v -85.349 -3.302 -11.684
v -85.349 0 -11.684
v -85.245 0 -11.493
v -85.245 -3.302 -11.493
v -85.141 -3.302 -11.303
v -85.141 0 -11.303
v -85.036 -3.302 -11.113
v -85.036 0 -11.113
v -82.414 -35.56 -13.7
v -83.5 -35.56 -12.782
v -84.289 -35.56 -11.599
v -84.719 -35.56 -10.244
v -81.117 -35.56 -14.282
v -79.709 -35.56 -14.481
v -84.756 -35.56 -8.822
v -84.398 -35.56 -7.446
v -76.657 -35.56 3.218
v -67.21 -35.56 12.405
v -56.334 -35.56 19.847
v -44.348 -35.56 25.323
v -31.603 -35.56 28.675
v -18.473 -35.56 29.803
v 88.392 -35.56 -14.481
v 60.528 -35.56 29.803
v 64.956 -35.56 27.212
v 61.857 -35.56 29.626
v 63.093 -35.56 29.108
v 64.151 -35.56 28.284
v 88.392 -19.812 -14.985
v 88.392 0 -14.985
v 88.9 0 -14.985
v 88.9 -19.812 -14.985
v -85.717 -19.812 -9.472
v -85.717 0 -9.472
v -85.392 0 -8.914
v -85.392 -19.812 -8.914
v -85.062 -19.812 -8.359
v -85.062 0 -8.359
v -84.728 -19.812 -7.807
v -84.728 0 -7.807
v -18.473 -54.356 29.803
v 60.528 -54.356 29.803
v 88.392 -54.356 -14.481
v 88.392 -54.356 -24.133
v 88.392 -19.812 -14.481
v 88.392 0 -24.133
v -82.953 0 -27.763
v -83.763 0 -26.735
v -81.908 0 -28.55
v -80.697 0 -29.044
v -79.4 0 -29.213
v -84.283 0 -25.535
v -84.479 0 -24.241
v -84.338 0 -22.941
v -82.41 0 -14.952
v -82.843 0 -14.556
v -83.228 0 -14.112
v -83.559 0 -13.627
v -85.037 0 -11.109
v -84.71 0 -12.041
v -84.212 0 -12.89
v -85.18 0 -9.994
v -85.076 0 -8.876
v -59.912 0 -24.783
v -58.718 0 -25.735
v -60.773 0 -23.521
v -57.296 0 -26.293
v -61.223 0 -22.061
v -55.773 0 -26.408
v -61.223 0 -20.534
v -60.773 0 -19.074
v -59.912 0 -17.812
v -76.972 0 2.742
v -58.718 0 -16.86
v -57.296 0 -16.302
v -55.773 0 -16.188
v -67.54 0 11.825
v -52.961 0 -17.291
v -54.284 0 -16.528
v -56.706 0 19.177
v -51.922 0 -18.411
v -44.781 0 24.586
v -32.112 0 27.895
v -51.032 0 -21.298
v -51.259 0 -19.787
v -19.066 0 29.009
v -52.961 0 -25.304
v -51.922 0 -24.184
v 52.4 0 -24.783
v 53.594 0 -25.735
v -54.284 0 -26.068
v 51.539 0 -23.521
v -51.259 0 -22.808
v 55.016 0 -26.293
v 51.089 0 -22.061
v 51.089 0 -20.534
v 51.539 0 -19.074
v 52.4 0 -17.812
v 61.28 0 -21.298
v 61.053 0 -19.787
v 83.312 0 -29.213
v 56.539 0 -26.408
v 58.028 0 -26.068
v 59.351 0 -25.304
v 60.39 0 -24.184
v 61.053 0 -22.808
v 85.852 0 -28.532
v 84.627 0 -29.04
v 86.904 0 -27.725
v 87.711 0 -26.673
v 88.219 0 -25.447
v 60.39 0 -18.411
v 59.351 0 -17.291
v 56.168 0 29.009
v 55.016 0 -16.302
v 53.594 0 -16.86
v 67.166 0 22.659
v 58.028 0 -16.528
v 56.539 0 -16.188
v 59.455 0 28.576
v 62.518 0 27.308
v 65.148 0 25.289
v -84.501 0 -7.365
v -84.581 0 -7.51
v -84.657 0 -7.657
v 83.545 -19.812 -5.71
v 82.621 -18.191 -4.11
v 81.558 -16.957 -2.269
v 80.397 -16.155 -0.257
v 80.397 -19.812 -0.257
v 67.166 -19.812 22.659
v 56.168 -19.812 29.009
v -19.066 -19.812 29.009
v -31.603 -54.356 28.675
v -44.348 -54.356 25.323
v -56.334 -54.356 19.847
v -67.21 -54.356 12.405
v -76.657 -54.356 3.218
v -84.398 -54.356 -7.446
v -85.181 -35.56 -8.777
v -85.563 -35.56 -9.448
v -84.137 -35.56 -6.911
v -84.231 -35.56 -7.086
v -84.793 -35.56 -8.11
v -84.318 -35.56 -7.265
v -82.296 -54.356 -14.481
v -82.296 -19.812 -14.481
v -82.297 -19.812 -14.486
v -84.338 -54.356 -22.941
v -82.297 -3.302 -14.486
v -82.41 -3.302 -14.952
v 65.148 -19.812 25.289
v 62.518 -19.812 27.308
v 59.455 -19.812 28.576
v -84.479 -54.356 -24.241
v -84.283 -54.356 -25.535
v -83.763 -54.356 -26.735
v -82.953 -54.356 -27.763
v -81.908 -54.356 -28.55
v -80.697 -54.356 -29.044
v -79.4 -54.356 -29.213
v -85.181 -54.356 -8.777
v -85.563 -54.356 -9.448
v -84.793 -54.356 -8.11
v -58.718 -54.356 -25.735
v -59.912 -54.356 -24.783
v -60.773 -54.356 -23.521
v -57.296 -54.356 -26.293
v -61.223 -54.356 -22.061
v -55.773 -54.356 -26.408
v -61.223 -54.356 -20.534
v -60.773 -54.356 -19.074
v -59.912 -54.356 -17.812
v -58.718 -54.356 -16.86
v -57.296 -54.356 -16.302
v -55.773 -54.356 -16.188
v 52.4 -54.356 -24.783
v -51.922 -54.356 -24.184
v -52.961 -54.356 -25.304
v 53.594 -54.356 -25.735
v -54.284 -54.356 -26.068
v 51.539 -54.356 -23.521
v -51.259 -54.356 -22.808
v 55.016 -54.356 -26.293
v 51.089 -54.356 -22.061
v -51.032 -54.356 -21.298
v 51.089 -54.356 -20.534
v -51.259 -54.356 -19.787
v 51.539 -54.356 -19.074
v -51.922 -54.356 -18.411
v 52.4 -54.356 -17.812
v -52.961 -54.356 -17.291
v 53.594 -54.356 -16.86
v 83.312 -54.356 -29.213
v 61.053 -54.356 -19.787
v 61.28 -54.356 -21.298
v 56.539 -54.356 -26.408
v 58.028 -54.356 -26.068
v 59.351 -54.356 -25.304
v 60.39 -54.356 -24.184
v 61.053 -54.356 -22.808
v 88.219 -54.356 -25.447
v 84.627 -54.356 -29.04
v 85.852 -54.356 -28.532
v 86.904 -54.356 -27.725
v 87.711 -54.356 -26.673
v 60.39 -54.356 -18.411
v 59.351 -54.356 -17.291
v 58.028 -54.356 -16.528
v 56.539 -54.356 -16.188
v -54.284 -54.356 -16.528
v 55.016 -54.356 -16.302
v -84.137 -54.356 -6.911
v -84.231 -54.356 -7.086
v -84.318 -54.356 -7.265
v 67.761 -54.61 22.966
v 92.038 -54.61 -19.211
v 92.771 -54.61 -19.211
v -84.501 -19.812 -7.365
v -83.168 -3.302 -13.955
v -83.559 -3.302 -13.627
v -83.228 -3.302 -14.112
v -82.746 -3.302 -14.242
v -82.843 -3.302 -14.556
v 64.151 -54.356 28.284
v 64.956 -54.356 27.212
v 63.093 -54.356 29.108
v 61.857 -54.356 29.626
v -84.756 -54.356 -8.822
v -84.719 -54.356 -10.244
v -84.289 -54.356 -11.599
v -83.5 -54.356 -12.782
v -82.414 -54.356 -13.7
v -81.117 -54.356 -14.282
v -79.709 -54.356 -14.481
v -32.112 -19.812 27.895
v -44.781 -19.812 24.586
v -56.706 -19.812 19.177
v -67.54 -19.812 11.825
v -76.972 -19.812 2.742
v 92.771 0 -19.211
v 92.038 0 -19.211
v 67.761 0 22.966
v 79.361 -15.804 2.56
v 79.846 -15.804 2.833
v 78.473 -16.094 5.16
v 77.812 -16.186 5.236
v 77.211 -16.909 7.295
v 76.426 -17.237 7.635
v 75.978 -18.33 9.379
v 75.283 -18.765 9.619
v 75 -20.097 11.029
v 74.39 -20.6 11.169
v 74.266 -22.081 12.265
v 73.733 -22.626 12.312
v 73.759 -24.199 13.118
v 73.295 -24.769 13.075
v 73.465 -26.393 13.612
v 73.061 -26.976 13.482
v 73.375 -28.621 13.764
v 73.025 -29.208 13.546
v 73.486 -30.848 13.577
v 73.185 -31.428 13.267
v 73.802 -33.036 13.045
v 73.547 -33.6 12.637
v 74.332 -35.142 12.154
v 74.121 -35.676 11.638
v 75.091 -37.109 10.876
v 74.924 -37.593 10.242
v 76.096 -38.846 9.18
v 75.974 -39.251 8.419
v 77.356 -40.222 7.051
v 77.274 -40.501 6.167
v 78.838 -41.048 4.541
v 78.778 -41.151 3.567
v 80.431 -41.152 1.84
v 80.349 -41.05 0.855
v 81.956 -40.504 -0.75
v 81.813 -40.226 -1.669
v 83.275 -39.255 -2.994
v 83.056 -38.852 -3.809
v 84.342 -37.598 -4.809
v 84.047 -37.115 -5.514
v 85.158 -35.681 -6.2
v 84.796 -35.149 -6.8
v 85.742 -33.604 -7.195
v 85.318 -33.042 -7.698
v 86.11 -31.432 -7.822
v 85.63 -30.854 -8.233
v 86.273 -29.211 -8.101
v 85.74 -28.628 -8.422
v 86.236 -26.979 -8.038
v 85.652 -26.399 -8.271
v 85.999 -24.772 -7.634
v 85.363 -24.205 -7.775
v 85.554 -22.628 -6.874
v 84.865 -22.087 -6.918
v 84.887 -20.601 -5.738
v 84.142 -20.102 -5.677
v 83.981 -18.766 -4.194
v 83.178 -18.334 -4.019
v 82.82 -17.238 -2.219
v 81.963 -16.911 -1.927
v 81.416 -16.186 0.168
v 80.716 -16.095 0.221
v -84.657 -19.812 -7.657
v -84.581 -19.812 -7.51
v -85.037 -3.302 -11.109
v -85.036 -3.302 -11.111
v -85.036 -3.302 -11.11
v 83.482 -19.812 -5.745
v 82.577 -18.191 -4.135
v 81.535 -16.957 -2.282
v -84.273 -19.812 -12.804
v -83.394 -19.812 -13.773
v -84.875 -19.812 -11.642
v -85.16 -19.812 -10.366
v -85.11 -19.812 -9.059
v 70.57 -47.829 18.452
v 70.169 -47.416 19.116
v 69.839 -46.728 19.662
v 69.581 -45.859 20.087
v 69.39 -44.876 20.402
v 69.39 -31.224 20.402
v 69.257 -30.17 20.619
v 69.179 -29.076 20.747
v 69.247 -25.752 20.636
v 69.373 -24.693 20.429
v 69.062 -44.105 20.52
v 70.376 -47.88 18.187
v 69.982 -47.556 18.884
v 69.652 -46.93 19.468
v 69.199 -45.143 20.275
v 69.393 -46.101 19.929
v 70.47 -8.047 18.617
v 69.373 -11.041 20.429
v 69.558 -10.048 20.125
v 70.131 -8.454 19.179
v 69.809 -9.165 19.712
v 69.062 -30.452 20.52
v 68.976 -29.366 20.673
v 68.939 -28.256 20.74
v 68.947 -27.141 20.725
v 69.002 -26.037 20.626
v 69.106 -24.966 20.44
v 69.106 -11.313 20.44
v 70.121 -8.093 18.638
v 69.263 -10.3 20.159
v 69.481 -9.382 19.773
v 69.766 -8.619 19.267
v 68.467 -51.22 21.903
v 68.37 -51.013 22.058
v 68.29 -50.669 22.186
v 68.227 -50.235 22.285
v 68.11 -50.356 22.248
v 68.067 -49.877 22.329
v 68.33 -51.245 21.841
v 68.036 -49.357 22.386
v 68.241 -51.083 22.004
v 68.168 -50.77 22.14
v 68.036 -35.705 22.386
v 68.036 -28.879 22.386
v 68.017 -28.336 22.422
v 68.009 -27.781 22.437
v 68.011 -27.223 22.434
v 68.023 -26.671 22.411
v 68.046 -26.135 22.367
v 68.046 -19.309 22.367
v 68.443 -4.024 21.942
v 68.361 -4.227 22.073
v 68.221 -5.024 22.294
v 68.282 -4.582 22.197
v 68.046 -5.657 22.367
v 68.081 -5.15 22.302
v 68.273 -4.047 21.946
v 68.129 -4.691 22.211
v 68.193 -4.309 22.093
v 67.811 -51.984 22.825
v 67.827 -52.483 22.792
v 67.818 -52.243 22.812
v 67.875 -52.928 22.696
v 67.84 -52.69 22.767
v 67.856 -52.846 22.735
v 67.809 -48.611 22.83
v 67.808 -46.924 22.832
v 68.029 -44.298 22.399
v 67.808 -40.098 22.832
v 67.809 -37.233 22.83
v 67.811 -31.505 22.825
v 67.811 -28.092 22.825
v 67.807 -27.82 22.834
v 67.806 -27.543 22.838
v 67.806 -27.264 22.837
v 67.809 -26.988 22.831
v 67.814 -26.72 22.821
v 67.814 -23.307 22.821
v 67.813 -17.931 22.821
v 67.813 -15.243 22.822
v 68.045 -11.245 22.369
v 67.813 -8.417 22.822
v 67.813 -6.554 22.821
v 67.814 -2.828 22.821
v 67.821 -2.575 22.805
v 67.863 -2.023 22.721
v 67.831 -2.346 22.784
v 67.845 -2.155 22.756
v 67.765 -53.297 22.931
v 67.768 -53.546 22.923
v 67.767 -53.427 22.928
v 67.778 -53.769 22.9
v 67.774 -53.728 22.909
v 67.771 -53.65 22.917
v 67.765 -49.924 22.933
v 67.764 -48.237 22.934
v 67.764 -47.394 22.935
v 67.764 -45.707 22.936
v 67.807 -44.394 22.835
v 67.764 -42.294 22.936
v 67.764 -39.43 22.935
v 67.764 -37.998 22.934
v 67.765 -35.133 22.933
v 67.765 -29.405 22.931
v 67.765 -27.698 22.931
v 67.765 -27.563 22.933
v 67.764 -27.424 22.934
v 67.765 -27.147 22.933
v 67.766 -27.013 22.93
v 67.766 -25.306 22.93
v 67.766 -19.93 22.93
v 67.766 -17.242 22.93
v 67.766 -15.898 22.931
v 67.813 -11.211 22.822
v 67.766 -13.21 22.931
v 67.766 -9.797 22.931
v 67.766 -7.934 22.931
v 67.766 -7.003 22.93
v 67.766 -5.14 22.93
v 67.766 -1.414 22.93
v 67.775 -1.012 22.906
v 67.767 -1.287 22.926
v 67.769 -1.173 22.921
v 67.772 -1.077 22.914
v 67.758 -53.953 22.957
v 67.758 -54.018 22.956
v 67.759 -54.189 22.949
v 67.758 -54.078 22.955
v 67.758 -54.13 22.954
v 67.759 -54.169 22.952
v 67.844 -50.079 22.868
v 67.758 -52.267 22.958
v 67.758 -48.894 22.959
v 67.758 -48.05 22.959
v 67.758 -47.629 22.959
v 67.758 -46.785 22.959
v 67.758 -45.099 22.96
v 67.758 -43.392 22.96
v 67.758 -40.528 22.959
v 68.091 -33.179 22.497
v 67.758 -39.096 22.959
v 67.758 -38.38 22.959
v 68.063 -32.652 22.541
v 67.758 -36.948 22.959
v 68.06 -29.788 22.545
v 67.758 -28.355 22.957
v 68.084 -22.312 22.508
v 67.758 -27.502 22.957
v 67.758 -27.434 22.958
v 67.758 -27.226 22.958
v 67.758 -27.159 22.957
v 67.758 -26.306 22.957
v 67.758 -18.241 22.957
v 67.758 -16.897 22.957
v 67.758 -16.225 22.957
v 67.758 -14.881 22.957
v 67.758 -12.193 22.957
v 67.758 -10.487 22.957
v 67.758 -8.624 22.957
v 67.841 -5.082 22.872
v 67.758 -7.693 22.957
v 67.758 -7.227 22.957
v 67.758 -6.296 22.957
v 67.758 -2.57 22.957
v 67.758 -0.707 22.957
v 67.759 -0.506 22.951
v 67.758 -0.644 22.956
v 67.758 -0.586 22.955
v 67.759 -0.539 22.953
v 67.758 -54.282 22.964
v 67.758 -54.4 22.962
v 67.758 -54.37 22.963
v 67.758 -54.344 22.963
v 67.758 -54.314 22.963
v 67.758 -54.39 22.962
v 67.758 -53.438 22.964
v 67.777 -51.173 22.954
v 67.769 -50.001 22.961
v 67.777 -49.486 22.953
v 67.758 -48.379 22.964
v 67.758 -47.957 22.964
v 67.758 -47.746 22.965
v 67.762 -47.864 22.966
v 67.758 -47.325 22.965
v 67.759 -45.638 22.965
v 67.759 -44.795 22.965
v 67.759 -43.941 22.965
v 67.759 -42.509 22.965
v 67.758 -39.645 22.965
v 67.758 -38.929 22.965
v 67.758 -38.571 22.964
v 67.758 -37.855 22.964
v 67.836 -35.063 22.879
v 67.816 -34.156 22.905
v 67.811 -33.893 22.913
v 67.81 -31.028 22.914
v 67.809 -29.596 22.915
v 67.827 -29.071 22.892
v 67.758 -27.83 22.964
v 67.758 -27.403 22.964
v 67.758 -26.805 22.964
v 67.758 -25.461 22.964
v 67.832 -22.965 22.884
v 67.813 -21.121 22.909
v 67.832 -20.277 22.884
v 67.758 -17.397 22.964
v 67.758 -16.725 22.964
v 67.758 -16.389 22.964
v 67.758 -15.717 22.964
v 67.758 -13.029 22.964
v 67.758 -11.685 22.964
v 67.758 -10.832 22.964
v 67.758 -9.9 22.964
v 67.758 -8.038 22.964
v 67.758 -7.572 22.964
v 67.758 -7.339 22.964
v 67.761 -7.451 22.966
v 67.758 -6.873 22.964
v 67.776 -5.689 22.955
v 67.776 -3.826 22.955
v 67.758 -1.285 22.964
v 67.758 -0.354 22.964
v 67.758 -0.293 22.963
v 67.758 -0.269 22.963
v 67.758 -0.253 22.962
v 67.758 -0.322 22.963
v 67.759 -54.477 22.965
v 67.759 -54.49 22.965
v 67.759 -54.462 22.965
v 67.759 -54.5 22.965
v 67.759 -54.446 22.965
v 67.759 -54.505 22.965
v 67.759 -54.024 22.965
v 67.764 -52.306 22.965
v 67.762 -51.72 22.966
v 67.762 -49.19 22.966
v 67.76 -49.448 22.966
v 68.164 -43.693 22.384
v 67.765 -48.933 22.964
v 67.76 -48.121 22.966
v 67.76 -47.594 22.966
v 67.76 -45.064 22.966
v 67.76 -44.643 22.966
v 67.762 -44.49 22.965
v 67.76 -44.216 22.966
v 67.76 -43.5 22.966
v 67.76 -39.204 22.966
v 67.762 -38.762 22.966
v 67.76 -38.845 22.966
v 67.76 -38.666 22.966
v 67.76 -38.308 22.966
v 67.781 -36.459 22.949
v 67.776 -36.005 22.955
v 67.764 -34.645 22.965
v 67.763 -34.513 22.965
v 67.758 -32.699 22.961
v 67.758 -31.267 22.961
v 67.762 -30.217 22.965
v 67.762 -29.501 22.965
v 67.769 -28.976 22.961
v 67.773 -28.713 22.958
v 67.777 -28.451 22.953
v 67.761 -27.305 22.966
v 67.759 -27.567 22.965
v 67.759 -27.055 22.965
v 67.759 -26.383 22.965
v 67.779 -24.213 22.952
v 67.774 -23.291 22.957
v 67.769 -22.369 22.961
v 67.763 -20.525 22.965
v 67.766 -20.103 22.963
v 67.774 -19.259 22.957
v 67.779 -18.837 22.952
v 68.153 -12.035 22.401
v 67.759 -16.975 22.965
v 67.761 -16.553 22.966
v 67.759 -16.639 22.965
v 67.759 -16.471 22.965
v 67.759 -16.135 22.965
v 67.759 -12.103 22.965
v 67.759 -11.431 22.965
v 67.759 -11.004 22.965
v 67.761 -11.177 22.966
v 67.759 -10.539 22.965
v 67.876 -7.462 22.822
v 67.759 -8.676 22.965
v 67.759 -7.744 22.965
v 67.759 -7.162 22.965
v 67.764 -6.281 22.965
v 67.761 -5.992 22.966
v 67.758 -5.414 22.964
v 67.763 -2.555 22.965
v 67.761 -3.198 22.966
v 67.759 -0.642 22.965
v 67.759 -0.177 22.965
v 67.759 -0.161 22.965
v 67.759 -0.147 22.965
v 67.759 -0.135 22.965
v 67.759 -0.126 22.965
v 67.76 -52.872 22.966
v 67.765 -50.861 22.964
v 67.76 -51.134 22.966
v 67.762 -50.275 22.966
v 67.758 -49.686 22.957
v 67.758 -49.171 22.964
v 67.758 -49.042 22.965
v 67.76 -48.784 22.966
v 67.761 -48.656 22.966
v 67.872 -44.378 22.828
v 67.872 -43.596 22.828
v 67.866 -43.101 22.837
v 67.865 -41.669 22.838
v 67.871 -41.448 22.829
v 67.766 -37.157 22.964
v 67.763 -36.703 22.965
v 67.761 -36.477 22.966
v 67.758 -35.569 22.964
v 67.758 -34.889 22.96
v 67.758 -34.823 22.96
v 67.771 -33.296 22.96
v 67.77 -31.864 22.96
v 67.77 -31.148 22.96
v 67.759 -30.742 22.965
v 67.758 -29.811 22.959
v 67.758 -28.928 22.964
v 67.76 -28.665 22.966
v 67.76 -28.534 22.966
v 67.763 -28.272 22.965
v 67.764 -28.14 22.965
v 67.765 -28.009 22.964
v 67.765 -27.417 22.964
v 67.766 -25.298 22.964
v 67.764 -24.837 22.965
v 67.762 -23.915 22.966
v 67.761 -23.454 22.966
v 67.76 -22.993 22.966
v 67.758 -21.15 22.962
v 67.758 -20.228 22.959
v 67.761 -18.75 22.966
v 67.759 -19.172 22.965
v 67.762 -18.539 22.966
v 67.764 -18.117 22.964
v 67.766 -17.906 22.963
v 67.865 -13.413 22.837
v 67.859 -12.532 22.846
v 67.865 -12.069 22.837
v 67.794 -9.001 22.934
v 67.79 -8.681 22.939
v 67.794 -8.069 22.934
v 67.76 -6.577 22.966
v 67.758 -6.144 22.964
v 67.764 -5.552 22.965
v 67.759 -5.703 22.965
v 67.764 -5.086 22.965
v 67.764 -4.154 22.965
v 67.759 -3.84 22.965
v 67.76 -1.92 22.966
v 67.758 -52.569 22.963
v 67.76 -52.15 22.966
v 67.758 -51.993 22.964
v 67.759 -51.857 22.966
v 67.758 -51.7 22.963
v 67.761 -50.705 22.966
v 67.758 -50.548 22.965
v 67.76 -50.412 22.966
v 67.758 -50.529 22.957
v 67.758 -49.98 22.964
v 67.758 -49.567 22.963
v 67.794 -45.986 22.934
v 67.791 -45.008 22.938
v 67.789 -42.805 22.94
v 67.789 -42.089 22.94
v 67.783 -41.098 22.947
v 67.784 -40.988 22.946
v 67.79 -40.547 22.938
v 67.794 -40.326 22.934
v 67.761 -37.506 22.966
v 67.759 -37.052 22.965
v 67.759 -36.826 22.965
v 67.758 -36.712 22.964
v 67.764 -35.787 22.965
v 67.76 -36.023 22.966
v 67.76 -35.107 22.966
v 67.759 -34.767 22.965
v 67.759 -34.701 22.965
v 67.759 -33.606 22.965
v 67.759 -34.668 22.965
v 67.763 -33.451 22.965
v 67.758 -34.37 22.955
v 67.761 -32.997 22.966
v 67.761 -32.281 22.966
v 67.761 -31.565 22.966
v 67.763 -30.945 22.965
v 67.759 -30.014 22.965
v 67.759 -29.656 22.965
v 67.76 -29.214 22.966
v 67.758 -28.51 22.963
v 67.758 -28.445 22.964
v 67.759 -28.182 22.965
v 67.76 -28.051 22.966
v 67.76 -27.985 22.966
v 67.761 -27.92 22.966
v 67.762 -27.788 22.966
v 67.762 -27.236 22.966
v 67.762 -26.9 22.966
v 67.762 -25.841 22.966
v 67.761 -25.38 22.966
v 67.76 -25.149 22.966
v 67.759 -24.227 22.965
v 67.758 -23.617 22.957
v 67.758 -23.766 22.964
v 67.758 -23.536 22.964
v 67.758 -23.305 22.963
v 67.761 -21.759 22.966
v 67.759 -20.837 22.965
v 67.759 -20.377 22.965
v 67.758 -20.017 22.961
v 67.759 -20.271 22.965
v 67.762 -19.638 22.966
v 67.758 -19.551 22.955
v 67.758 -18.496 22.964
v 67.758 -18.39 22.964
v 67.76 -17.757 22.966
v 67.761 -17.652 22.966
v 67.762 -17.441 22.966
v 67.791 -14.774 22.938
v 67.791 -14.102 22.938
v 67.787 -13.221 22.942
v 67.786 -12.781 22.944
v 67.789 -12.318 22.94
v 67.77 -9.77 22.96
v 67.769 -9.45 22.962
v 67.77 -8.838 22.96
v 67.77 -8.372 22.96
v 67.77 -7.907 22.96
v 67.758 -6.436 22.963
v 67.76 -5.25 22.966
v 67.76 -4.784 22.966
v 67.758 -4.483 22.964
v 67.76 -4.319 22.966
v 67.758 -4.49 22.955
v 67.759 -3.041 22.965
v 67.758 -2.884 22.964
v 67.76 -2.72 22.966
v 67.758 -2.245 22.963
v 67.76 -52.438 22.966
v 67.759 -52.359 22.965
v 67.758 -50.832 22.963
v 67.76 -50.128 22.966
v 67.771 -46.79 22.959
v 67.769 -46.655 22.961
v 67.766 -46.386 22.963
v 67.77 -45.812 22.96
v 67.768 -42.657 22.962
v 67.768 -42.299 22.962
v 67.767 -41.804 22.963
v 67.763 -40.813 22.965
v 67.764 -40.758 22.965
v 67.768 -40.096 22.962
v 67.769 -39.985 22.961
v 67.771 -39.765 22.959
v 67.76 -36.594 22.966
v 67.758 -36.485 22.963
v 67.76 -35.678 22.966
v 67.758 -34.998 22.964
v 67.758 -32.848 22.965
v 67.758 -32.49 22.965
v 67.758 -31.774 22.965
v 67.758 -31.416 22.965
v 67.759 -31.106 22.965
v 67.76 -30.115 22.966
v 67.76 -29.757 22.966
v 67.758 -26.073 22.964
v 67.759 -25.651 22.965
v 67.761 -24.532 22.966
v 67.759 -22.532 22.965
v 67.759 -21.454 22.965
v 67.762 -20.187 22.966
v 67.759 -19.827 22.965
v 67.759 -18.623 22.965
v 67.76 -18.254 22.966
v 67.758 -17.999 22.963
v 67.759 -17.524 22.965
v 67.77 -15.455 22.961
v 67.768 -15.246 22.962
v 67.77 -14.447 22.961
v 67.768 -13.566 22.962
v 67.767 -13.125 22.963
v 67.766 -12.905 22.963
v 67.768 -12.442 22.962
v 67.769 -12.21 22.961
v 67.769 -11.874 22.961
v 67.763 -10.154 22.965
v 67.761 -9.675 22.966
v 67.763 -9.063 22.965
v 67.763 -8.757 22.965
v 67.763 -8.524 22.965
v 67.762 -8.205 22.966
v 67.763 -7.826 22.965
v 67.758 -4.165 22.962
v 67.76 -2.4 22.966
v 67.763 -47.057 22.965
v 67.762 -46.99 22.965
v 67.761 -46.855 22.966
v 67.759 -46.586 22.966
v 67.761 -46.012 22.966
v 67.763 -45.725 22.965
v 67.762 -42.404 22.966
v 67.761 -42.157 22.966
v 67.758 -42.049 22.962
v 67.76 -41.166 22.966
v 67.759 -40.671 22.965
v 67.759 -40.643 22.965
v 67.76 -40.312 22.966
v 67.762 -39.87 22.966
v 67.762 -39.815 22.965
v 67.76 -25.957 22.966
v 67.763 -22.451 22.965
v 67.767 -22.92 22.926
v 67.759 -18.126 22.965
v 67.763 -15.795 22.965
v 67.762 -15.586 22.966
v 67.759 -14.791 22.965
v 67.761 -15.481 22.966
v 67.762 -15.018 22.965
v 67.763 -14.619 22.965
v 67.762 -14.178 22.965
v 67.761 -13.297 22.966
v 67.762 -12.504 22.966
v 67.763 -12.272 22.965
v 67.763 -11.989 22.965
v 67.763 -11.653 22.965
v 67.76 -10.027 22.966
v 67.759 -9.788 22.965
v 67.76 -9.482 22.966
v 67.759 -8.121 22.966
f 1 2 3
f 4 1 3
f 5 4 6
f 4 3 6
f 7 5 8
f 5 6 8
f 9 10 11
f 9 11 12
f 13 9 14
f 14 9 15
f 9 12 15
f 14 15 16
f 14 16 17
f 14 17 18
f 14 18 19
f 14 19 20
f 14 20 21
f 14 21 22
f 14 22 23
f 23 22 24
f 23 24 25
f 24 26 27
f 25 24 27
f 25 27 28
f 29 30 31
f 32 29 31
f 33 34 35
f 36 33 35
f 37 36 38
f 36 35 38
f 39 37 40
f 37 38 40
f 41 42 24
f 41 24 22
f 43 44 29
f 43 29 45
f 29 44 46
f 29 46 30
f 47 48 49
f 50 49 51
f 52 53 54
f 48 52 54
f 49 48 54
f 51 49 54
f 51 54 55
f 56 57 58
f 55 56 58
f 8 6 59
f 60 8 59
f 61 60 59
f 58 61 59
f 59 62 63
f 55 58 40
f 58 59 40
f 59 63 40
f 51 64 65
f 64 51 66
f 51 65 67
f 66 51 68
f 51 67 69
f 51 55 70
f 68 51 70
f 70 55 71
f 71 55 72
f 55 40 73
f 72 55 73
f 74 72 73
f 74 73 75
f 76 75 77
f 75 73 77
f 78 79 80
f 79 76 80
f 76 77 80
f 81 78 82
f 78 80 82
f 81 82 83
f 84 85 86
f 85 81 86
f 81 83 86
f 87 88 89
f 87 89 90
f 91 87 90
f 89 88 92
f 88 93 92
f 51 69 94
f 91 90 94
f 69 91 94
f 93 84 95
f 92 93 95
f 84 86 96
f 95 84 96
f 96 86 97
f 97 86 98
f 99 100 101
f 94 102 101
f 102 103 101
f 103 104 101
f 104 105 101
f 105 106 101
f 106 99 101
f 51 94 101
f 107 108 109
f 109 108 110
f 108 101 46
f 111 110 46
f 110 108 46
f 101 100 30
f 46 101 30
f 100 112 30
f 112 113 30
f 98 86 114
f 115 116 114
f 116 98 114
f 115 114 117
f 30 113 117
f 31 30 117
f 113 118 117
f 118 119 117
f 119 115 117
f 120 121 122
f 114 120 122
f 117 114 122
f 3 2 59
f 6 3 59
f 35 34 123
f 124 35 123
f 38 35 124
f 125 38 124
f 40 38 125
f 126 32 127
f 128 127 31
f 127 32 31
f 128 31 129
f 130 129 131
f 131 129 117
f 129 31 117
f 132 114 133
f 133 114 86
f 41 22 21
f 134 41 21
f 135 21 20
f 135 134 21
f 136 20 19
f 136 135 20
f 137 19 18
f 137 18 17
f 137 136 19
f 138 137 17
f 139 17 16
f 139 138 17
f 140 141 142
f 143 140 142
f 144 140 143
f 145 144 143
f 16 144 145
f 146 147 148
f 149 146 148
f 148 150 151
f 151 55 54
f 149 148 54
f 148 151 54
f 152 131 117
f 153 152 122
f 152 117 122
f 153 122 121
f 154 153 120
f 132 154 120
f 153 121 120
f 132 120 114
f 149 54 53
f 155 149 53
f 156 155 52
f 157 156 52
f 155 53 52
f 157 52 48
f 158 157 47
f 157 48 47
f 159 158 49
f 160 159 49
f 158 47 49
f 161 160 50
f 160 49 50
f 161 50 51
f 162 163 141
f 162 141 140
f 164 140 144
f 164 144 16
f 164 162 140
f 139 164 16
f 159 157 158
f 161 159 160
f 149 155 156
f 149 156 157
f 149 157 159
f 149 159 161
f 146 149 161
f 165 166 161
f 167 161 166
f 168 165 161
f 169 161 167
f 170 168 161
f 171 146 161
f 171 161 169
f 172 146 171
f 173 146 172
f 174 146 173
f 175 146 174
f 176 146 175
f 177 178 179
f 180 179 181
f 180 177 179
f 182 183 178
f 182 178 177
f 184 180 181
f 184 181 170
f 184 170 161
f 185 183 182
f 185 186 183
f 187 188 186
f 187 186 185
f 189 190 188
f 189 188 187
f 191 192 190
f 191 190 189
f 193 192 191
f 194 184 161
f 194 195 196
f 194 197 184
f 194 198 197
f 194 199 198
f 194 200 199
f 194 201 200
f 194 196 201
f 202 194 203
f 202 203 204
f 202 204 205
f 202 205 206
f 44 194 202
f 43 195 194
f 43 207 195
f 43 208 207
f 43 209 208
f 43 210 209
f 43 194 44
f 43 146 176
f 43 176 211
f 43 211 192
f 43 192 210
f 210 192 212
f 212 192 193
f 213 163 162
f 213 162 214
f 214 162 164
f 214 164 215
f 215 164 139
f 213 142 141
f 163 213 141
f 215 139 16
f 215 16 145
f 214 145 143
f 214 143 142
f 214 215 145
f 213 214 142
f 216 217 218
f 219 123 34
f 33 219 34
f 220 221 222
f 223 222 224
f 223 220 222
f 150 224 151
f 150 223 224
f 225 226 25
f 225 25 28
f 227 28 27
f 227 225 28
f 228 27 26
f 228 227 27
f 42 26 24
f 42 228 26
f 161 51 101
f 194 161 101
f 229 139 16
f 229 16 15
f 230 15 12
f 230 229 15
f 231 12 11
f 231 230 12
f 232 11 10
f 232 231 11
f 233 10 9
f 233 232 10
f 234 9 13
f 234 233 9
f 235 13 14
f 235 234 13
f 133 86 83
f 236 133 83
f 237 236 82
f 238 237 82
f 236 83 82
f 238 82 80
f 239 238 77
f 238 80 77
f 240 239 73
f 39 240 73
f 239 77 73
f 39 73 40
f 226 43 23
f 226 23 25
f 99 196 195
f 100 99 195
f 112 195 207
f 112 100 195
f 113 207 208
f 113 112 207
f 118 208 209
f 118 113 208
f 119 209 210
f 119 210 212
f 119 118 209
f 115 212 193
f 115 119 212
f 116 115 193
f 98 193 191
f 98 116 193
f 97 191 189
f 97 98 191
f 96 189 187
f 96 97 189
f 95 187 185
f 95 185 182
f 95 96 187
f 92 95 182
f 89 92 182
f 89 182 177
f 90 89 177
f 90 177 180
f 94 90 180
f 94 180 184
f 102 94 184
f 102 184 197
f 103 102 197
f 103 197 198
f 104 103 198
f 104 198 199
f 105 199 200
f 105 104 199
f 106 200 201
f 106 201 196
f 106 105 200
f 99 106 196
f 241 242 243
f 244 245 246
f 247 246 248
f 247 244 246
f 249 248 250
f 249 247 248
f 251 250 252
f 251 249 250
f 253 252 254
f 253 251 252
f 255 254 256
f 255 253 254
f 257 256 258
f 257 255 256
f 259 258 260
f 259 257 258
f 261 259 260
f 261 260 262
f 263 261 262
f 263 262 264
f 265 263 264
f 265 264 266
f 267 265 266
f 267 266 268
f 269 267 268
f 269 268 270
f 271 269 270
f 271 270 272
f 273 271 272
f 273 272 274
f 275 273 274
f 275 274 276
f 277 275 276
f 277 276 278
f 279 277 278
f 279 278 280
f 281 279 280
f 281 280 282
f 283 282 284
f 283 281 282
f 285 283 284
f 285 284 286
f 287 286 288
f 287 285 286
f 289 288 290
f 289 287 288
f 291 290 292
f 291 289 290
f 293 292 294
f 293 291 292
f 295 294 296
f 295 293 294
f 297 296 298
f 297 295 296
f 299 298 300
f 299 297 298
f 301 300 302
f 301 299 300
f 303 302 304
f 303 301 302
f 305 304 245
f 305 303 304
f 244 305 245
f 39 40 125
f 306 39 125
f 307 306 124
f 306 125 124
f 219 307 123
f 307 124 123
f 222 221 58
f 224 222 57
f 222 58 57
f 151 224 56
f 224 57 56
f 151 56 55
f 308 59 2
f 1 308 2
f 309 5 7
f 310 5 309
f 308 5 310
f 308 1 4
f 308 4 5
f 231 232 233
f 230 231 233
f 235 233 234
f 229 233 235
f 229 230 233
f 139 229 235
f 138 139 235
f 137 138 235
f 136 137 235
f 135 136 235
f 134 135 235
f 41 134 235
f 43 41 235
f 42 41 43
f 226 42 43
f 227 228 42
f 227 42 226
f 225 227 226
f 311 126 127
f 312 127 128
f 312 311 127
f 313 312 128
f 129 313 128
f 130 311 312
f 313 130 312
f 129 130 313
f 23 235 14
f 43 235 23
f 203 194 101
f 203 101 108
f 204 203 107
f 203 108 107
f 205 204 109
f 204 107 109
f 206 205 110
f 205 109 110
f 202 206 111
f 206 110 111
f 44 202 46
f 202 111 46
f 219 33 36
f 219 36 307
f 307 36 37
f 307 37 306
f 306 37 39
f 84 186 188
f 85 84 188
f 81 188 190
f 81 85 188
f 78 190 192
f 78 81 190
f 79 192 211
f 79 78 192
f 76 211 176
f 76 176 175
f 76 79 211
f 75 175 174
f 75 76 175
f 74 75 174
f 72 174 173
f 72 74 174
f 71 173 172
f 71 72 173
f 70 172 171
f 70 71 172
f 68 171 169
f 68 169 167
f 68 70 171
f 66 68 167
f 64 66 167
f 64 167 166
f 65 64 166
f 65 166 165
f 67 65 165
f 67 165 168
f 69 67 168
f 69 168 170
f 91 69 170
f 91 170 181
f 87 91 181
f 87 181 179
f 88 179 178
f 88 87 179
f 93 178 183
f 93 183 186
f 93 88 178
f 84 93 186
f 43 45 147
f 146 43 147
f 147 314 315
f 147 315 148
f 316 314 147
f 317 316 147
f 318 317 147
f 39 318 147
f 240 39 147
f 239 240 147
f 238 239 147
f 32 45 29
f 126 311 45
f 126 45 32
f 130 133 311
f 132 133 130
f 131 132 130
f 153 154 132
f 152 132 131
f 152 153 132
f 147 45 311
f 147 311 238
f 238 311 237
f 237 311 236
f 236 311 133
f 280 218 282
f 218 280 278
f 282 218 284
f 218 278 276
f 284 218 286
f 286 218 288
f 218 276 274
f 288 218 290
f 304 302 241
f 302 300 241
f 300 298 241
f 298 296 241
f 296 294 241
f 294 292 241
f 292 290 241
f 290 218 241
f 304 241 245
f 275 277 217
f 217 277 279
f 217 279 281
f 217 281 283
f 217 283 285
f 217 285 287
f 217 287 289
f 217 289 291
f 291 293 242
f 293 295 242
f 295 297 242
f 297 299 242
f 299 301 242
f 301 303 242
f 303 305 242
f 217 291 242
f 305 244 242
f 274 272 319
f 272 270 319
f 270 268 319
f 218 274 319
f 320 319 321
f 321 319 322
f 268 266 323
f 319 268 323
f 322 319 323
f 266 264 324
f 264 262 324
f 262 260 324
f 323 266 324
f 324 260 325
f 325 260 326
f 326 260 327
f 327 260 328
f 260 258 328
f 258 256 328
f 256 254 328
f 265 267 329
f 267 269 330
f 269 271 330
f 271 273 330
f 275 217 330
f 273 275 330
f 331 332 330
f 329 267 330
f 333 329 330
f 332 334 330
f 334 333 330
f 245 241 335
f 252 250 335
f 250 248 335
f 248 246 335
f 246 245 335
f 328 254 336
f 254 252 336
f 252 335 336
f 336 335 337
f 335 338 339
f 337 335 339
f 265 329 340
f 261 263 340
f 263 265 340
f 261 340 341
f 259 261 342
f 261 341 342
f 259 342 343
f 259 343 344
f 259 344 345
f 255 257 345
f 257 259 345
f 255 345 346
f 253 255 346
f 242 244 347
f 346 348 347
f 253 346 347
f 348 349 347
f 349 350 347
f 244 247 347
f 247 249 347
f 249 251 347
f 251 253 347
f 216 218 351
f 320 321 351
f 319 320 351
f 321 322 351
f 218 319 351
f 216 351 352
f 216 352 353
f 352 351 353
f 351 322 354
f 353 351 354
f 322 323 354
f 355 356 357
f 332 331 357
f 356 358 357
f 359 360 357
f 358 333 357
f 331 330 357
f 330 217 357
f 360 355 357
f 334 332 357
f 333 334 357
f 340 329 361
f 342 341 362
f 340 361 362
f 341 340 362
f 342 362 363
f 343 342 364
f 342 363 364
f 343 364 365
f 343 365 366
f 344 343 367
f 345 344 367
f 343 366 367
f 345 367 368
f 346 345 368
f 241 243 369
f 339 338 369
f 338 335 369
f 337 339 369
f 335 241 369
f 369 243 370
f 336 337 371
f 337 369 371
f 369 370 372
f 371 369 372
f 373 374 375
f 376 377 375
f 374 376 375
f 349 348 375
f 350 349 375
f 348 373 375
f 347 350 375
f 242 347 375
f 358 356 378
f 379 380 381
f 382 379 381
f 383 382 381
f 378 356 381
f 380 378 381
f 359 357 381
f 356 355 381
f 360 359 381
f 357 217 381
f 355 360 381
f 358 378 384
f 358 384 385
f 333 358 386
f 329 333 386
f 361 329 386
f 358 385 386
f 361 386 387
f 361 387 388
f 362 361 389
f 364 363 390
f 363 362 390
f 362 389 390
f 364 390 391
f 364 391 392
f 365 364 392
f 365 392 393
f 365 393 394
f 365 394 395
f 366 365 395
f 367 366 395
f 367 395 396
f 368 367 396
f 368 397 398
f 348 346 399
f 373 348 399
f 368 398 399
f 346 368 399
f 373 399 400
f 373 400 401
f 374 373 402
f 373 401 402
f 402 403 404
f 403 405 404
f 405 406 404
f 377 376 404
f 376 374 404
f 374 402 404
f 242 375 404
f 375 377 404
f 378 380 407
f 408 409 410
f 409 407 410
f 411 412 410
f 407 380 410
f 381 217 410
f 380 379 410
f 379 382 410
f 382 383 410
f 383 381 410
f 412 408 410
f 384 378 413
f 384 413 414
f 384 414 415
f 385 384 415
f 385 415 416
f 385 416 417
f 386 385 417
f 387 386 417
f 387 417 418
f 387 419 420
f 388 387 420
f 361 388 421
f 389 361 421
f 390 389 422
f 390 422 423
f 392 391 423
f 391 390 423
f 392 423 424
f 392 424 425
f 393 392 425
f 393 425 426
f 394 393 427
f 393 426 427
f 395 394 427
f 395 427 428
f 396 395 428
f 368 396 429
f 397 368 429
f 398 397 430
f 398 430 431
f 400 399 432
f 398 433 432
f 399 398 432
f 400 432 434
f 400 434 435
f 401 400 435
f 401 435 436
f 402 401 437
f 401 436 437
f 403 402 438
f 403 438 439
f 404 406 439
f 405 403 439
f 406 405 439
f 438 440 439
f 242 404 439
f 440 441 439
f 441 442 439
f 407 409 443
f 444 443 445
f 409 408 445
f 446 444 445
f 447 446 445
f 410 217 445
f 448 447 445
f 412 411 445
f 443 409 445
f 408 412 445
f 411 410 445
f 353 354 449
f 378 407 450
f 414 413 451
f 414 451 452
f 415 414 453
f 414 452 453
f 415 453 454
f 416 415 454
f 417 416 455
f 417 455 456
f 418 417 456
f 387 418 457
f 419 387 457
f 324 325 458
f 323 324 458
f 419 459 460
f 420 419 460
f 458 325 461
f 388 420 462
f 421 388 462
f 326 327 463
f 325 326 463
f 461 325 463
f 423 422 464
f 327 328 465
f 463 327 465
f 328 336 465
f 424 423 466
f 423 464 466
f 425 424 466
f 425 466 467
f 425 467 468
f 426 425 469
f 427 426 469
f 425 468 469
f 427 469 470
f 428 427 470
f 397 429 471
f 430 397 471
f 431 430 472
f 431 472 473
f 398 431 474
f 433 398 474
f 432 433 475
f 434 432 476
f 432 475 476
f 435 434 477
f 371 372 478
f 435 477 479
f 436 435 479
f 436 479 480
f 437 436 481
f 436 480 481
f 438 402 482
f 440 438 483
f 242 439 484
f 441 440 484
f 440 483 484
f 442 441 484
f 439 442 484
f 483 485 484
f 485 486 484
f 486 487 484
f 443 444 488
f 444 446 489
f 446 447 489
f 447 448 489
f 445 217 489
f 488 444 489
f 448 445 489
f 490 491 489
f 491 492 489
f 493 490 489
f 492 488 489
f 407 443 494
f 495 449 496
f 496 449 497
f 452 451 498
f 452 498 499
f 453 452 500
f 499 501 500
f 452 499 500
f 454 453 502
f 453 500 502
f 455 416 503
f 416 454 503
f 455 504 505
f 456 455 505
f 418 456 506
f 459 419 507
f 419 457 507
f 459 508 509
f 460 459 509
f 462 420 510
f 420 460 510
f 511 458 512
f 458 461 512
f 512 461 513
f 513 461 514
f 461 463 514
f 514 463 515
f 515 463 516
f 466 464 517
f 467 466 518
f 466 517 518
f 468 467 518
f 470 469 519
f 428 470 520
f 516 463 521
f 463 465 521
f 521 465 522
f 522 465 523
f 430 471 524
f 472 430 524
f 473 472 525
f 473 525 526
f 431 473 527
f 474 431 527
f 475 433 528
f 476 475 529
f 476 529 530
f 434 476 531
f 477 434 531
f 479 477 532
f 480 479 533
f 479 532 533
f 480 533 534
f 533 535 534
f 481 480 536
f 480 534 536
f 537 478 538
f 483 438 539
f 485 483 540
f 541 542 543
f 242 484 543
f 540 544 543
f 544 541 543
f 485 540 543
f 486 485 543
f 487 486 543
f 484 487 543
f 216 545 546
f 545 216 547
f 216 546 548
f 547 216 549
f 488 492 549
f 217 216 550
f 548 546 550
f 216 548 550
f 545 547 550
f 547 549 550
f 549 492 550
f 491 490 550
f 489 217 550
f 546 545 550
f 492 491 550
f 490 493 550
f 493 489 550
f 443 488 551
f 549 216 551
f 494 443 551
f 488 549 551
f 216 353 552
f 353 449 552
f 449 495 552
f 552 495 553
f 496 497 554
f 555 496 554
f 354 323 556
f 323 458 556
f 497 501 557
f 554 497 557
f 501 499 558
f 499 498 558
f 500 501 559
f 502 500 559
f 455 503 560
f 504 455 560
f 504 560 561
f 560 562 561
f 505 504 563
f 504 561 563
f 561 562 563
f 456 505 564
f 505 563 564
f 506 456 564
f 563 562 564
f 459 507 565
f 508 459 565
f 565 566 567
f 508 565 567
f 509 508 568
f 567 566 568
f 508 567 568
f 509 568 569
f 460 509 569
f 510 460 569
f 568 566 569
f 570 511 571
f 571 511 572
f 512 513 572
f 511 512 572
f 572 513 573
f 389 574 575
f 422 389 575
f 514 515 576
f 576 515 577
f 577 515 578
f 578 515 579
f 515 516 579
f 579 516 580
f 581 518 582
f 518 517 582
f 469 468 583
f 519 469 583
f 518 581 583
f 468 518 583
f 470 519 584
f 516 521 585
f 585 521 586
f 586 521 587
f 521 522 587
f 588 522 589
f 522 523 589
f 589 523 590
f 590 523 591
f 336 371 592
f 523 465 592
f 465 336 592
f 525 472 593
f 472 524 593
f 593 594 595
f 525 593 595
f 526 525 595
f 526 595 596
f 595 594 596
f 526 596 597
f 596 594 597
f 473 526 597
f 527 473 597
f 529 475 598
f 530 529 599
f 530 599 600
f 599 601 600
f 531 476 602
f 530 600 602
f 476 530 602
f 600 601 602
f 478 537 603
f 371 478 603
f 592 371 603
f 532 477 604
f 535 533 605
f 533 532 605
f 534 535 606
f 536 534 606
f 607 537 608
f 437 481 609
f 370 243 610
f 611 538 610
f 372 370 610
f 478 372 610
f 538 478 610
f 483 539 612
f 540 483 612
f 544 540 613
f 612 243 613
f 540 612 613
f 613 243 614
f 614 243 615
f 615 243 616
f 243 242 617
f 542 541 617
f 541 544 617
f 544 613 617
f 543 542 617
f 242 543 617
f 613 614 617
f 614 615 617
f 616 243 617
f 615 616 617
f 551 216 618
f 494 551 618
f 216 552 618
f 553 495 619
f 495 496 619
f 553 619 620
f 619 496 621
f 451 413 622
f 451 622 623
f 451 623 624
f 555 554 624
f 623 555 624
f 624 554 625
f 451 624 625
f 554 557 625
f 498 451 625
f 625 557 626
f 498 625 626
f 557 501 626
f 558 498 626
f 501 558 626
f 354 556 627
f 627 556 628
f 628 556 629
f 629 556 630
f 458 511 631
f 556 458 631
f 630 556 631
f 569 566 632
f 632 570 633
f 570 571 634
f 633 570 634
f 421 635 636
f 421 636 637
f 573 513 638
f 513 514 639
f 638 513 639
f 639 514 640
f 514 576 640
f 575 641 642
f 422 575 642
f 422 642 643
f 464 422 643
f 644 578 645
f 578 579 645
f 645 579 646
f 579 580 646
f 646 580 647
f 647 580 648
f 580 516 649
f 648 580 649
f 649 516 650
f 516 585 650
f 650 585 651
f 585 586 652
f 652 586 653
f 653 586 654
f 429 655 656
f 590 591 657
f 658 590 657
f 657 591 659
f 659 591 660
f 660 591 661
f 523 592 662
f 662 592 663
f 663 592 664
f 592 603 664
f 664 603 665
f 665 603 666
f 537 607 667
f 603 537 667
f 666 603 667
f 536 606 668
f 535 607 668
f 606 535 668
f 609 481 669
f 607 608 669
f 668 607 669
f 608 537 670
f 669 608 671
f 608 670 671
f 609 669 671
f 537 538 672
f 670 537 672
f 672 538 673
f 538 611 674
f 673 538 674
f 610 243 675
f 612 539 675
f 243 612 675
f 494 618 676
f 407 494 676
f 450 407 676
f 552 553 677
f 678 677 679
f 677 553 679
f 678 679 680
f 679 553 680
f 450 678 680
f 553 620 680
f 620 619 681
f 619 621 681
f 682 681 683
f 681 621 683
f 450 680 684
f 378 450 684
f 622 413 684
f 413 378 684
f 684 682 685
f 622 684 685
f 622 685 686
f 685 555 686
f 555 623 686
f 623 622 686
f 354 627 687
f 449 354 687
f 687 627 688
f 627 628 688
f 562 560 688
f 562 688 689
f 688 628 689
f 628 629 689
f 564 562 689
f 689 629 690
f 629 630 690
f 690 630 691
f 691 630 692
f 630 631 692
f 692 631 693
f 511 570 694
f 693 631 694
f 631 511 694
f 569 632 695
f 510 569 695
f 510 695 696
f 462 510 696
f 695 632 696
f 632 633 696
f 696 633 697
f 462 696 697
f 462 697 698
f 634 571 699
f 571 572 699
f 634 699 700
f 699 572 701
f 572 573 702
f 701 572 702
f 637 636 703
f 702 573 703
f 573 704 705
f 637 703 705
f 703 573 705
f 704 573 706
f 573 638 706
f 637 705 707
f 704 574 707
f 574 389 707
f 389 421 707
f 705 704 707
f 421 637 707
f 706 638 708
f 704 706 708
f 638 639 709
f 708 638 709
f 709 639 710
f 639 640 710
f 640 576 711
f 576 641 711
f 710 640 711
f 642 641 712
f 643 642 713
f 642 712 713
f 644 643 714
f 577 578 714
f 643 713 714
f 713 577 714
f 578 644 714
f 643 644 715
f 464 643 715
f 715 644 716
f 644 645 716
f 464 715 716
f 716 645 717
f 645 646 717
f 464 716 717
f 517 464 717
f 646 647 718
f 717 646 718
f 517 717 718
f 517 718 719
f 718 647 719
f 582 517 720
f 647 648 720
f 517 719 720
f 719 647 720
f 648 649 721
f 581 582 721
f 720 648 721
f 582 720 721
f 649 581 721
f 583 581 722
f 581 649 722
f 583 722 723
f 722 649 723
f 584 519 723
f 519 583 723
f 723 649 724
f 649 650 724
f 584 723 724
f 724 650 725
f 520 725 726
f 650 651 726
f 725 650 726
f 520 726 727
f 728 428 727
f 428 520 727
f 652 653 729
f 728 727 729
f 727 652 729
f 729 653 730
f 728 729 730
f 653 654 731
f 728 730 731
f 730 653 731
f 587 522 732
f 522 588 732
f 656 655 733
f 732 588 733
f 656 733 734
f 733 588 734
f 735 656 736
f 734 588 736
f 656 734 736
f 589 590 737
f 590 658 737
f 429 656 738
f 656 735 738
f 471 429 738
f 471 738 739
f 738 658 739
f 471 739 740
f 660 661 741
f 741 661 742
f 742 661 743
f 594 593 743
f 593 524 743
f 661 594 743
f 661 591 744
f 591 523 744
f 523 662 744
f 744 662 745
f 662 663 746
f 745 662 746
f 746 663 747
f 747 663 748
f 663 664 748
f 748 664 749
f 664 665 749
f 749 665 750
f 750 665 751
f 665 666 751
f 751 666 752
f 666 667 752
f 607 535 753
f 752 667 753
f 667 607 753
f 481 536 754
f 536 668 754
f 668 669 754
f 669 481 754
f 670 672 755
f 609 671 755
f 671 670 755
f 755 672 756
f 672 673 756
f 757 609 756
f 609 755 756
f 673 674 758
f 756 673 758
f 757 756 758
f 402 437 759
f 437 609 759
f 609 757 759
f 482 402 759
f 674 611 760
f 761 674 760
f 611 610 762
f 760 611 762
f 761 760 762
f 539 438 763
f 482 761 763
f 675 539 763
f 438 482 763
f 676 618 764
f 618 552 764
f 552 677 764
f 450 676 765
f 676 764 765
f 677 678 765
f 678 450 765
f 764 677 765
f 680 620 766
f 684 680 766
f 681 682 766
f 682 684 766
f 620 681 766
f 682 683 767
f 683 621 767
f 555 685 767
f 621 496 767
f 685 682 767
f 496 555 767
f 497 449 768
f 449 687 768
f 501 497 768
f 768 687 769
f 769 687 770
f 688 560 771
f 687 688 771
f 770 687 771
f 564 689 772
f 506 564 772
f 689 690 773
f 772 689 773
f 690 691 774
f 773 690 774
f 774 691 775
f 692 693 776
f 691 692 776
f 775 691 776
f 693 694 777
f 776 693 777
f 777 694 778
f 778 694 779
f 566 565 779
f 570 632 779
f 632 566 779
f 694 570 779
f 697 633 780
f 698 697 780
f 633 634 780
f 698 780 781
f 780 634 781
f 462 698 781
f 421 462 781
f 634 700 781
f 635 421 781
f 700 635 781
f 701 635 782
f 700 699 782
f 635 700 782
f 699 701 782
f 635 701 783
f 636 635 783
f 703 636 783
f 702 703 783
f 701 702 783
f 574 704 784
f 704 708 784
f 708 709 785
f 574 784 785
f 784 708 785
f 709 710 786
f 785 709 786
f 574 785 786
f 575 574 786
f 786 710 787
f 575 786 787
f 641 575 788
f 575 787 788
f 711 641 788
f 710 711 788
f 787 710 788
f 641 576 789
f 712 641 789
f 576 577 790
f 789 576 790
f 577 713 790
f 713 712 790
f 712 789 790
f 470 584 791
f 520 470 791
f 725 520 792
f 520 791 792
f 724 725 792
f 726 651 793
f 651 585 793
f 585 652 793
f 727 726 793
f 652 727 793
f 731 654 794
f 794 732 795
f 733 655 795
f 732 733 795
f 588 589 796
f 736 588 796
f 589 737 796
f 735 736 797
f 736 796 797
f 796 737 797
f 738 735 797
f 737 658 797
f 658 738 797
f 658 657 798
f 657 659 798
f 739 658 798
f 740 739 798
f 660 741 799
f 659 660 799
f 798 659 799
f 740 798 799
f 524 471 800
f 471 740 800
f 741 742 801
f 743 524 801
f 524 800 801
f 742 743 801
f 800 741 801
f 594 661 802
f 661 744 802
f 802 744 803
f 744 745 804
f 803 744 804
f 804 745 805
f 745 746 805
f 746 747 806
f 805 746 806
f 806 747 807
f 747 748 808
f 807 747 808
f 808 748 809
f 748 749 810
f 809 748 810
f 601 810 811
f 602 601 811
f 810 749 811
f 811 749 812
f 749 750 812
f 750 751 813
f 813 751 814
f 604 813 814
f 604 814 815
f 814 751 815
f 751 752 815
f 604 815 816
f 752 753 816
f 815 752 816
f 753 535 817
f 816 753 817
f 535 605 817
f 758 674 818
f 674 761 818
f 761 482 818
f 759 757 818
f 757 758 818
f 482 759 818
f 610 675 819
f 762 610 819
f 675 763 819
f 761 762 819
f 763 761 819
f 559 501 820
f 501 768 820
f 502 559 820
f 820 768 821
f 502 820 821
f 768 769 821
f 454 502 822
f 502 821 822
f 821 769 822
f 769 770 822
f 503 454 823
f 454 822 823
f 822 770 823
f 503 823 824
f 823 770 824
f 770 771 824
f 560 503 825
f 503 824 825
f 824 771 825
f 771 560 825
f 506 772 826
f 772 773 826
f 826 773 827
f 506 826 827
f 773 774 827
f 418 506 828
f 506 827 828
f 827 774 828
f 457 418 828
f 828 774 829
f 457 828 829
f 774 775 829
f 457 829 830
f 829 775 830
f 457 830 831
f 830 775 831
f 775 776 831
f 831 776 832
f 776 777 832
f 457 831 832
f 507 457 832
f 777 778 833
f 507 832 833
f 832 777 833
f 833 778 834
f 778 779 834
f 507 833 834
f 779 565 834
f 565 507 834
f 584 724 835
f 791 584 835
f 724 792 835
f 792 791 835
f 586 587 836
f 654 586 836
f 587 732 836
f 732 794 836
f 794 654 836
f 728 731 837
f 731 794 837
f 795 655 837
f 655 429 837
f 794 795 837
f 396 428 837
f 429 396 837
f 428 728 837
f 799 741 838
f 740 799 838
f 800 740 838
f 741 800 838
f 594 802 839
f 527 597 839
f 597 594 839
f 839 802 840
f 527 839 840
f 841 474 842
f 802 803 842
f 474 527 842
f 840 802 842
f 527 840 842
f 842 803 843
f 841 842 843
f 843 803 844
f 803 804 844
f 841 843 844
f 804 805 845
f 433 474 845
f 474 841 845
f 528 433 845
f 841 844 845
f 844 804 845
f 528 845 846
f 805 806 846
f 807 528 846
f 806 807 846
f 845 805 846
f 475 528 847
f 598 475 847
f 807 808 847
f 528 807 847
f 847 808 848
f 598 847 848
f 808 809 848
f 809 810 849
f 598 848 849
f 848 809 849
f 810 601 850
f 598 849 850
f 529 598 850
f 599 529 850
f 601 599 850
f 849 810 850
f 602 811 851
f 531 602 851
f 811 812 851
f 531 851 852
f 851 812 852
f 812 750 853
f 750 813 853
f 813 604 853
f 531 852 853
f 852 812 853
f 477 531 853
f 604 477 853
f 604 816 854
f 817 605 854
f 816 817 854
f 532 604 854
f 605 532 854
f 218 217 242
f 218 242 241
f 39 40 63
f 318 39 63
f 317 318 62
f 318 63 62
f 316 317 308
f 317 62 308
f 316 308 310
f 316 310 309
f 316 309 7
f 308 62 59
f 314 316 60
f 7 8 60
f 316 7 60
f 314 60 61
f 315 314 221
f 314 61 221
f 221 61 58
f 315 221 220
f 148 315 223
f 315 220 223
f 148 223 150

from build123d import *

# Parameters (mm, degrees)
F1_DEPTH  = 19.812
F2_R      = 5.1242394883
F3_DEPTH  = 54.356
F5_DEPTH  = 3.302
F7_DEPTH  = 18.796
F9_DEPTH  = 54.61
F10_R     = 12.7
F11_DEPTH = 2.032


with BuildPart() as f1:
    # F0 (on Front) → F1 (new body)
    with BuildSketch(Plane.XZ):
        with BuildLine():
            ThreePointArc((-85.7170157087, -9.4718691174), (-85.2277014399, -8.6365296474), (-84.727918394, -7.8074112054))
            ThreePointArc((-84.727918394, -7.8074112054), (-84.6196735387, -7.5834012546), (-84.5005909488, -7.3649596296))
            Line((-84.5005909488, -7.3649596296), (-85.7170157087, -9.4718691174))
        make_face()
    extrude(amount=F1_DEPTH)


with BuildPart() as f1b:
    # F0 (on Front) → F1, piece 2 (new body)
    with BuildSketch(Plane.XZ):
        with BuildLine():
            Line((56.1676515813, 29.0091308826), (-19.0659685826, 29.0091308826))
            ThreePointArc((-19.0659685826, 29.0091308826), (-56.7055402604, 19.1769460761), (-84.727918394, -7.8074112054))
            ThreePointArc((-84.727918394, -7.8074112054), (-84.3709562473, -12.6573089902), (-80.1011818976, -14.9849596296))
            Line((-80.1011818976, -14.9849596296), (88.9, -14.9849596296))
            Line((88.9, -14.9849596296), (67.1661742094, 22.6591308826))
            ThreePointArc((67.1661742094, 22.6591308826), (62.5176515813, 27.3076535107), (56.1676515813, 29.0091308826))
        make_face()
    extrude(amount=F1_DEPTH)

    # F2 (on Front) → F3 (join)
    with BuildSketch(Plane.XZ):
        with BuildLine():
            Line((88.3919969201, -24.1326461864), (88.3919969201, -14.480644837))
            Line((88.3919969201, -14.480644837), (-82.2959989309, -14.480644837))
            Line((-82.2959989309, -14.480644837), (-84.338073465, -22.9406729495))
            ThreePointArc((-84.338073465, -22.9406729495), (-83.3912378163, -27.2751910116), (-79.3998956834, -29.2126461864))
            Line((-79.3998956834, -29.2126461864), (83.3119969201, -29.2126461864))
            ThreePointArc((83.3119969201, -29.2126461864), (86.9040993685, -27.7247486348), (88.3919969201, -24.1326461864))
        make_face()
        with Locations((-56.155923754, -21.2976261973)):
            Circle(F2_R, mode=Mode.SUBTRACT)
        with Locations((56.155923754, -21.2976261973)):
            Circle(F2_R, mode=Mode.SUBTRACT)
    extrude(amount=F3_DEPTH)

    # F4 (on Front) → F5 (join)
    with BuildSketch(Plane.XZ):
        with BuildLine():
            Line((-79.2033924988, -16.0920950719), (-64.6572164223, -16.0920950719))
            Line((-64.6572164223, -16.0920950719), (87.7427835777, -16.0920950719))
            Line((87.7427835777, -16.0920950719), (66.3843588363, 23.2386775878))
            ThreePointArc((66.3843588363, 23.2386775878), (62.6503484255, 27.1218714479), (57.4559156475, 28.5501208723))
            Line((57.4559156475, 28.5501208723), (-17.7160610295, 28.5501208723))
            ThreePointArc((-17.7160610295, 28.5501208723), (-55.8520275253, 18.4371859625), (-83.9657350648, -9.2439058049))
            ThreePointArc((-83.9657350648, -9.2439058049), (-83.3740520076, -13.9124397517), (-79.2033924988, -16.0920950719))
        make_face()
        with BuildLine():
            ThreePointArc((-85.3490181849, -11.6840620075), (-84.6684943252, -10.4576814707), (-83.9657350648, -9.2439058049))
            ThreePointArc((-83.9657350648, -9.2439058049), (-83.8283232848, -8.9105681925), (-83.6676140932, -8.5878167141))
            Line((-83.6676140932, -8.5878167141), (-85.3490181849, -11.6840620075))
        make_face()
    extrude(amount=F5_DEPTH)


with BuildPart() as f7:
    # F6 (on face) → F7 (new body)
    with BuildSketch(Plane.XZ.offset(54.356)):
        with BuildLine():
            ThreePointArc((-84.3979765826, -7.4462883676), (-83.9359273007, -12.2182918283), (-79.7089584774, -14.480644837))
            Line((-79.7089584774, -14.480644837), (88.3919969201, -14.480644837))
            Line((88.3919969201, -14.480644837), (64.9563029427, 27.2120561769))
            ThreePointArc((64.9563029427, 27.2120561769), (63.0932272173, 29.1075762271), (60.5279528105, 29.8028564849))
            Line((60.5279528105, 29.8028564849), (-18.4734850788, 29.8028564849))
            ThreePointArc((-18.4734850788, 29.8028564849), (-56.3335477183, 19.8465659501), (-84.3979765826, -7.4462883676))
        make_face()
    extrude(amount=-F7_DEPTH)


with BuildPart() as f7b:
    # F6 (on face) → F7, piece 2 (new body)
    with BuildSketch(Plane.XZ.offset(54.356)):
        with BuildLine():
            ThreePointArc((-85.5629895815, -9.4477681811), (-84.9880117911, -8.4426459948), (-84.3979765826, -7.4462883676))
            ThreePointArc((-84.3979765826, -7.4462883676), (-84.2754796054, -7.1750472121), (-84.1373086096, -6.911445145))
            Line((-84.1373086096, -6.911445145), (-85.5629895815, -9.4477681811))
        make_face()
    extrude(amount=-F7_DEPTH)


with BuildPart() as f9:
    # F8 (on Front) → F9 (new body)
    with BuildSketch(Plane.XZ):
        with BuildLine():
            Line((92.0380936613, -19.2105540628), (92.7708144684, -19.2105540628))
            add(Edge.make_bspline(
                [(92.7708144684, -19.2105540628), (68.1595448022, 22.9657674634), (67.7605854732, 22.9657674634), (67.3616261442, 22.9657674634), (92.0380936613, -19.2105540628)],
                knots=[4.6264811026, 4.6264811026, 4.6264811026, 6.279078523, 6.279078523, 7.9316759433, 7.9316759433, 7.9316759433], degree=2, weights=[1, 0.677602429, 1, 0.677602429, 1]))
        make_face()
    extrude(amount=F9_DEPTH)


with BuildPart() as f11_tool:
    # F10 (on face) → F11 (new body)
    with BuildSketch(Plane(origin=(60.9837637908, 0, 34.279305275), x_dir=(0, 1, 0), z_dir=(0.871722467, 0, 0.4899999394))):
        with Locations((-28.5039804876, -36.6549007595)):
            Circle(F10_R)
    extrude(amount=F11_DEPTH)


with BuildPart() as f1b_1:
    add(f1b.part)

    # F11: cut by f11_tool
    add(f11_tool.part, mode=Mode.SUBTRACT)


with BuildPart() as f9_1:
    add(f9.part)

    # F11: cut by f11_tool
    add(f11_tool.part, mode=Mode.SUBTRACT)


solid = Compound([f1.part, f7.part, f7b.part, f1b_1.part, f9_1.part])
